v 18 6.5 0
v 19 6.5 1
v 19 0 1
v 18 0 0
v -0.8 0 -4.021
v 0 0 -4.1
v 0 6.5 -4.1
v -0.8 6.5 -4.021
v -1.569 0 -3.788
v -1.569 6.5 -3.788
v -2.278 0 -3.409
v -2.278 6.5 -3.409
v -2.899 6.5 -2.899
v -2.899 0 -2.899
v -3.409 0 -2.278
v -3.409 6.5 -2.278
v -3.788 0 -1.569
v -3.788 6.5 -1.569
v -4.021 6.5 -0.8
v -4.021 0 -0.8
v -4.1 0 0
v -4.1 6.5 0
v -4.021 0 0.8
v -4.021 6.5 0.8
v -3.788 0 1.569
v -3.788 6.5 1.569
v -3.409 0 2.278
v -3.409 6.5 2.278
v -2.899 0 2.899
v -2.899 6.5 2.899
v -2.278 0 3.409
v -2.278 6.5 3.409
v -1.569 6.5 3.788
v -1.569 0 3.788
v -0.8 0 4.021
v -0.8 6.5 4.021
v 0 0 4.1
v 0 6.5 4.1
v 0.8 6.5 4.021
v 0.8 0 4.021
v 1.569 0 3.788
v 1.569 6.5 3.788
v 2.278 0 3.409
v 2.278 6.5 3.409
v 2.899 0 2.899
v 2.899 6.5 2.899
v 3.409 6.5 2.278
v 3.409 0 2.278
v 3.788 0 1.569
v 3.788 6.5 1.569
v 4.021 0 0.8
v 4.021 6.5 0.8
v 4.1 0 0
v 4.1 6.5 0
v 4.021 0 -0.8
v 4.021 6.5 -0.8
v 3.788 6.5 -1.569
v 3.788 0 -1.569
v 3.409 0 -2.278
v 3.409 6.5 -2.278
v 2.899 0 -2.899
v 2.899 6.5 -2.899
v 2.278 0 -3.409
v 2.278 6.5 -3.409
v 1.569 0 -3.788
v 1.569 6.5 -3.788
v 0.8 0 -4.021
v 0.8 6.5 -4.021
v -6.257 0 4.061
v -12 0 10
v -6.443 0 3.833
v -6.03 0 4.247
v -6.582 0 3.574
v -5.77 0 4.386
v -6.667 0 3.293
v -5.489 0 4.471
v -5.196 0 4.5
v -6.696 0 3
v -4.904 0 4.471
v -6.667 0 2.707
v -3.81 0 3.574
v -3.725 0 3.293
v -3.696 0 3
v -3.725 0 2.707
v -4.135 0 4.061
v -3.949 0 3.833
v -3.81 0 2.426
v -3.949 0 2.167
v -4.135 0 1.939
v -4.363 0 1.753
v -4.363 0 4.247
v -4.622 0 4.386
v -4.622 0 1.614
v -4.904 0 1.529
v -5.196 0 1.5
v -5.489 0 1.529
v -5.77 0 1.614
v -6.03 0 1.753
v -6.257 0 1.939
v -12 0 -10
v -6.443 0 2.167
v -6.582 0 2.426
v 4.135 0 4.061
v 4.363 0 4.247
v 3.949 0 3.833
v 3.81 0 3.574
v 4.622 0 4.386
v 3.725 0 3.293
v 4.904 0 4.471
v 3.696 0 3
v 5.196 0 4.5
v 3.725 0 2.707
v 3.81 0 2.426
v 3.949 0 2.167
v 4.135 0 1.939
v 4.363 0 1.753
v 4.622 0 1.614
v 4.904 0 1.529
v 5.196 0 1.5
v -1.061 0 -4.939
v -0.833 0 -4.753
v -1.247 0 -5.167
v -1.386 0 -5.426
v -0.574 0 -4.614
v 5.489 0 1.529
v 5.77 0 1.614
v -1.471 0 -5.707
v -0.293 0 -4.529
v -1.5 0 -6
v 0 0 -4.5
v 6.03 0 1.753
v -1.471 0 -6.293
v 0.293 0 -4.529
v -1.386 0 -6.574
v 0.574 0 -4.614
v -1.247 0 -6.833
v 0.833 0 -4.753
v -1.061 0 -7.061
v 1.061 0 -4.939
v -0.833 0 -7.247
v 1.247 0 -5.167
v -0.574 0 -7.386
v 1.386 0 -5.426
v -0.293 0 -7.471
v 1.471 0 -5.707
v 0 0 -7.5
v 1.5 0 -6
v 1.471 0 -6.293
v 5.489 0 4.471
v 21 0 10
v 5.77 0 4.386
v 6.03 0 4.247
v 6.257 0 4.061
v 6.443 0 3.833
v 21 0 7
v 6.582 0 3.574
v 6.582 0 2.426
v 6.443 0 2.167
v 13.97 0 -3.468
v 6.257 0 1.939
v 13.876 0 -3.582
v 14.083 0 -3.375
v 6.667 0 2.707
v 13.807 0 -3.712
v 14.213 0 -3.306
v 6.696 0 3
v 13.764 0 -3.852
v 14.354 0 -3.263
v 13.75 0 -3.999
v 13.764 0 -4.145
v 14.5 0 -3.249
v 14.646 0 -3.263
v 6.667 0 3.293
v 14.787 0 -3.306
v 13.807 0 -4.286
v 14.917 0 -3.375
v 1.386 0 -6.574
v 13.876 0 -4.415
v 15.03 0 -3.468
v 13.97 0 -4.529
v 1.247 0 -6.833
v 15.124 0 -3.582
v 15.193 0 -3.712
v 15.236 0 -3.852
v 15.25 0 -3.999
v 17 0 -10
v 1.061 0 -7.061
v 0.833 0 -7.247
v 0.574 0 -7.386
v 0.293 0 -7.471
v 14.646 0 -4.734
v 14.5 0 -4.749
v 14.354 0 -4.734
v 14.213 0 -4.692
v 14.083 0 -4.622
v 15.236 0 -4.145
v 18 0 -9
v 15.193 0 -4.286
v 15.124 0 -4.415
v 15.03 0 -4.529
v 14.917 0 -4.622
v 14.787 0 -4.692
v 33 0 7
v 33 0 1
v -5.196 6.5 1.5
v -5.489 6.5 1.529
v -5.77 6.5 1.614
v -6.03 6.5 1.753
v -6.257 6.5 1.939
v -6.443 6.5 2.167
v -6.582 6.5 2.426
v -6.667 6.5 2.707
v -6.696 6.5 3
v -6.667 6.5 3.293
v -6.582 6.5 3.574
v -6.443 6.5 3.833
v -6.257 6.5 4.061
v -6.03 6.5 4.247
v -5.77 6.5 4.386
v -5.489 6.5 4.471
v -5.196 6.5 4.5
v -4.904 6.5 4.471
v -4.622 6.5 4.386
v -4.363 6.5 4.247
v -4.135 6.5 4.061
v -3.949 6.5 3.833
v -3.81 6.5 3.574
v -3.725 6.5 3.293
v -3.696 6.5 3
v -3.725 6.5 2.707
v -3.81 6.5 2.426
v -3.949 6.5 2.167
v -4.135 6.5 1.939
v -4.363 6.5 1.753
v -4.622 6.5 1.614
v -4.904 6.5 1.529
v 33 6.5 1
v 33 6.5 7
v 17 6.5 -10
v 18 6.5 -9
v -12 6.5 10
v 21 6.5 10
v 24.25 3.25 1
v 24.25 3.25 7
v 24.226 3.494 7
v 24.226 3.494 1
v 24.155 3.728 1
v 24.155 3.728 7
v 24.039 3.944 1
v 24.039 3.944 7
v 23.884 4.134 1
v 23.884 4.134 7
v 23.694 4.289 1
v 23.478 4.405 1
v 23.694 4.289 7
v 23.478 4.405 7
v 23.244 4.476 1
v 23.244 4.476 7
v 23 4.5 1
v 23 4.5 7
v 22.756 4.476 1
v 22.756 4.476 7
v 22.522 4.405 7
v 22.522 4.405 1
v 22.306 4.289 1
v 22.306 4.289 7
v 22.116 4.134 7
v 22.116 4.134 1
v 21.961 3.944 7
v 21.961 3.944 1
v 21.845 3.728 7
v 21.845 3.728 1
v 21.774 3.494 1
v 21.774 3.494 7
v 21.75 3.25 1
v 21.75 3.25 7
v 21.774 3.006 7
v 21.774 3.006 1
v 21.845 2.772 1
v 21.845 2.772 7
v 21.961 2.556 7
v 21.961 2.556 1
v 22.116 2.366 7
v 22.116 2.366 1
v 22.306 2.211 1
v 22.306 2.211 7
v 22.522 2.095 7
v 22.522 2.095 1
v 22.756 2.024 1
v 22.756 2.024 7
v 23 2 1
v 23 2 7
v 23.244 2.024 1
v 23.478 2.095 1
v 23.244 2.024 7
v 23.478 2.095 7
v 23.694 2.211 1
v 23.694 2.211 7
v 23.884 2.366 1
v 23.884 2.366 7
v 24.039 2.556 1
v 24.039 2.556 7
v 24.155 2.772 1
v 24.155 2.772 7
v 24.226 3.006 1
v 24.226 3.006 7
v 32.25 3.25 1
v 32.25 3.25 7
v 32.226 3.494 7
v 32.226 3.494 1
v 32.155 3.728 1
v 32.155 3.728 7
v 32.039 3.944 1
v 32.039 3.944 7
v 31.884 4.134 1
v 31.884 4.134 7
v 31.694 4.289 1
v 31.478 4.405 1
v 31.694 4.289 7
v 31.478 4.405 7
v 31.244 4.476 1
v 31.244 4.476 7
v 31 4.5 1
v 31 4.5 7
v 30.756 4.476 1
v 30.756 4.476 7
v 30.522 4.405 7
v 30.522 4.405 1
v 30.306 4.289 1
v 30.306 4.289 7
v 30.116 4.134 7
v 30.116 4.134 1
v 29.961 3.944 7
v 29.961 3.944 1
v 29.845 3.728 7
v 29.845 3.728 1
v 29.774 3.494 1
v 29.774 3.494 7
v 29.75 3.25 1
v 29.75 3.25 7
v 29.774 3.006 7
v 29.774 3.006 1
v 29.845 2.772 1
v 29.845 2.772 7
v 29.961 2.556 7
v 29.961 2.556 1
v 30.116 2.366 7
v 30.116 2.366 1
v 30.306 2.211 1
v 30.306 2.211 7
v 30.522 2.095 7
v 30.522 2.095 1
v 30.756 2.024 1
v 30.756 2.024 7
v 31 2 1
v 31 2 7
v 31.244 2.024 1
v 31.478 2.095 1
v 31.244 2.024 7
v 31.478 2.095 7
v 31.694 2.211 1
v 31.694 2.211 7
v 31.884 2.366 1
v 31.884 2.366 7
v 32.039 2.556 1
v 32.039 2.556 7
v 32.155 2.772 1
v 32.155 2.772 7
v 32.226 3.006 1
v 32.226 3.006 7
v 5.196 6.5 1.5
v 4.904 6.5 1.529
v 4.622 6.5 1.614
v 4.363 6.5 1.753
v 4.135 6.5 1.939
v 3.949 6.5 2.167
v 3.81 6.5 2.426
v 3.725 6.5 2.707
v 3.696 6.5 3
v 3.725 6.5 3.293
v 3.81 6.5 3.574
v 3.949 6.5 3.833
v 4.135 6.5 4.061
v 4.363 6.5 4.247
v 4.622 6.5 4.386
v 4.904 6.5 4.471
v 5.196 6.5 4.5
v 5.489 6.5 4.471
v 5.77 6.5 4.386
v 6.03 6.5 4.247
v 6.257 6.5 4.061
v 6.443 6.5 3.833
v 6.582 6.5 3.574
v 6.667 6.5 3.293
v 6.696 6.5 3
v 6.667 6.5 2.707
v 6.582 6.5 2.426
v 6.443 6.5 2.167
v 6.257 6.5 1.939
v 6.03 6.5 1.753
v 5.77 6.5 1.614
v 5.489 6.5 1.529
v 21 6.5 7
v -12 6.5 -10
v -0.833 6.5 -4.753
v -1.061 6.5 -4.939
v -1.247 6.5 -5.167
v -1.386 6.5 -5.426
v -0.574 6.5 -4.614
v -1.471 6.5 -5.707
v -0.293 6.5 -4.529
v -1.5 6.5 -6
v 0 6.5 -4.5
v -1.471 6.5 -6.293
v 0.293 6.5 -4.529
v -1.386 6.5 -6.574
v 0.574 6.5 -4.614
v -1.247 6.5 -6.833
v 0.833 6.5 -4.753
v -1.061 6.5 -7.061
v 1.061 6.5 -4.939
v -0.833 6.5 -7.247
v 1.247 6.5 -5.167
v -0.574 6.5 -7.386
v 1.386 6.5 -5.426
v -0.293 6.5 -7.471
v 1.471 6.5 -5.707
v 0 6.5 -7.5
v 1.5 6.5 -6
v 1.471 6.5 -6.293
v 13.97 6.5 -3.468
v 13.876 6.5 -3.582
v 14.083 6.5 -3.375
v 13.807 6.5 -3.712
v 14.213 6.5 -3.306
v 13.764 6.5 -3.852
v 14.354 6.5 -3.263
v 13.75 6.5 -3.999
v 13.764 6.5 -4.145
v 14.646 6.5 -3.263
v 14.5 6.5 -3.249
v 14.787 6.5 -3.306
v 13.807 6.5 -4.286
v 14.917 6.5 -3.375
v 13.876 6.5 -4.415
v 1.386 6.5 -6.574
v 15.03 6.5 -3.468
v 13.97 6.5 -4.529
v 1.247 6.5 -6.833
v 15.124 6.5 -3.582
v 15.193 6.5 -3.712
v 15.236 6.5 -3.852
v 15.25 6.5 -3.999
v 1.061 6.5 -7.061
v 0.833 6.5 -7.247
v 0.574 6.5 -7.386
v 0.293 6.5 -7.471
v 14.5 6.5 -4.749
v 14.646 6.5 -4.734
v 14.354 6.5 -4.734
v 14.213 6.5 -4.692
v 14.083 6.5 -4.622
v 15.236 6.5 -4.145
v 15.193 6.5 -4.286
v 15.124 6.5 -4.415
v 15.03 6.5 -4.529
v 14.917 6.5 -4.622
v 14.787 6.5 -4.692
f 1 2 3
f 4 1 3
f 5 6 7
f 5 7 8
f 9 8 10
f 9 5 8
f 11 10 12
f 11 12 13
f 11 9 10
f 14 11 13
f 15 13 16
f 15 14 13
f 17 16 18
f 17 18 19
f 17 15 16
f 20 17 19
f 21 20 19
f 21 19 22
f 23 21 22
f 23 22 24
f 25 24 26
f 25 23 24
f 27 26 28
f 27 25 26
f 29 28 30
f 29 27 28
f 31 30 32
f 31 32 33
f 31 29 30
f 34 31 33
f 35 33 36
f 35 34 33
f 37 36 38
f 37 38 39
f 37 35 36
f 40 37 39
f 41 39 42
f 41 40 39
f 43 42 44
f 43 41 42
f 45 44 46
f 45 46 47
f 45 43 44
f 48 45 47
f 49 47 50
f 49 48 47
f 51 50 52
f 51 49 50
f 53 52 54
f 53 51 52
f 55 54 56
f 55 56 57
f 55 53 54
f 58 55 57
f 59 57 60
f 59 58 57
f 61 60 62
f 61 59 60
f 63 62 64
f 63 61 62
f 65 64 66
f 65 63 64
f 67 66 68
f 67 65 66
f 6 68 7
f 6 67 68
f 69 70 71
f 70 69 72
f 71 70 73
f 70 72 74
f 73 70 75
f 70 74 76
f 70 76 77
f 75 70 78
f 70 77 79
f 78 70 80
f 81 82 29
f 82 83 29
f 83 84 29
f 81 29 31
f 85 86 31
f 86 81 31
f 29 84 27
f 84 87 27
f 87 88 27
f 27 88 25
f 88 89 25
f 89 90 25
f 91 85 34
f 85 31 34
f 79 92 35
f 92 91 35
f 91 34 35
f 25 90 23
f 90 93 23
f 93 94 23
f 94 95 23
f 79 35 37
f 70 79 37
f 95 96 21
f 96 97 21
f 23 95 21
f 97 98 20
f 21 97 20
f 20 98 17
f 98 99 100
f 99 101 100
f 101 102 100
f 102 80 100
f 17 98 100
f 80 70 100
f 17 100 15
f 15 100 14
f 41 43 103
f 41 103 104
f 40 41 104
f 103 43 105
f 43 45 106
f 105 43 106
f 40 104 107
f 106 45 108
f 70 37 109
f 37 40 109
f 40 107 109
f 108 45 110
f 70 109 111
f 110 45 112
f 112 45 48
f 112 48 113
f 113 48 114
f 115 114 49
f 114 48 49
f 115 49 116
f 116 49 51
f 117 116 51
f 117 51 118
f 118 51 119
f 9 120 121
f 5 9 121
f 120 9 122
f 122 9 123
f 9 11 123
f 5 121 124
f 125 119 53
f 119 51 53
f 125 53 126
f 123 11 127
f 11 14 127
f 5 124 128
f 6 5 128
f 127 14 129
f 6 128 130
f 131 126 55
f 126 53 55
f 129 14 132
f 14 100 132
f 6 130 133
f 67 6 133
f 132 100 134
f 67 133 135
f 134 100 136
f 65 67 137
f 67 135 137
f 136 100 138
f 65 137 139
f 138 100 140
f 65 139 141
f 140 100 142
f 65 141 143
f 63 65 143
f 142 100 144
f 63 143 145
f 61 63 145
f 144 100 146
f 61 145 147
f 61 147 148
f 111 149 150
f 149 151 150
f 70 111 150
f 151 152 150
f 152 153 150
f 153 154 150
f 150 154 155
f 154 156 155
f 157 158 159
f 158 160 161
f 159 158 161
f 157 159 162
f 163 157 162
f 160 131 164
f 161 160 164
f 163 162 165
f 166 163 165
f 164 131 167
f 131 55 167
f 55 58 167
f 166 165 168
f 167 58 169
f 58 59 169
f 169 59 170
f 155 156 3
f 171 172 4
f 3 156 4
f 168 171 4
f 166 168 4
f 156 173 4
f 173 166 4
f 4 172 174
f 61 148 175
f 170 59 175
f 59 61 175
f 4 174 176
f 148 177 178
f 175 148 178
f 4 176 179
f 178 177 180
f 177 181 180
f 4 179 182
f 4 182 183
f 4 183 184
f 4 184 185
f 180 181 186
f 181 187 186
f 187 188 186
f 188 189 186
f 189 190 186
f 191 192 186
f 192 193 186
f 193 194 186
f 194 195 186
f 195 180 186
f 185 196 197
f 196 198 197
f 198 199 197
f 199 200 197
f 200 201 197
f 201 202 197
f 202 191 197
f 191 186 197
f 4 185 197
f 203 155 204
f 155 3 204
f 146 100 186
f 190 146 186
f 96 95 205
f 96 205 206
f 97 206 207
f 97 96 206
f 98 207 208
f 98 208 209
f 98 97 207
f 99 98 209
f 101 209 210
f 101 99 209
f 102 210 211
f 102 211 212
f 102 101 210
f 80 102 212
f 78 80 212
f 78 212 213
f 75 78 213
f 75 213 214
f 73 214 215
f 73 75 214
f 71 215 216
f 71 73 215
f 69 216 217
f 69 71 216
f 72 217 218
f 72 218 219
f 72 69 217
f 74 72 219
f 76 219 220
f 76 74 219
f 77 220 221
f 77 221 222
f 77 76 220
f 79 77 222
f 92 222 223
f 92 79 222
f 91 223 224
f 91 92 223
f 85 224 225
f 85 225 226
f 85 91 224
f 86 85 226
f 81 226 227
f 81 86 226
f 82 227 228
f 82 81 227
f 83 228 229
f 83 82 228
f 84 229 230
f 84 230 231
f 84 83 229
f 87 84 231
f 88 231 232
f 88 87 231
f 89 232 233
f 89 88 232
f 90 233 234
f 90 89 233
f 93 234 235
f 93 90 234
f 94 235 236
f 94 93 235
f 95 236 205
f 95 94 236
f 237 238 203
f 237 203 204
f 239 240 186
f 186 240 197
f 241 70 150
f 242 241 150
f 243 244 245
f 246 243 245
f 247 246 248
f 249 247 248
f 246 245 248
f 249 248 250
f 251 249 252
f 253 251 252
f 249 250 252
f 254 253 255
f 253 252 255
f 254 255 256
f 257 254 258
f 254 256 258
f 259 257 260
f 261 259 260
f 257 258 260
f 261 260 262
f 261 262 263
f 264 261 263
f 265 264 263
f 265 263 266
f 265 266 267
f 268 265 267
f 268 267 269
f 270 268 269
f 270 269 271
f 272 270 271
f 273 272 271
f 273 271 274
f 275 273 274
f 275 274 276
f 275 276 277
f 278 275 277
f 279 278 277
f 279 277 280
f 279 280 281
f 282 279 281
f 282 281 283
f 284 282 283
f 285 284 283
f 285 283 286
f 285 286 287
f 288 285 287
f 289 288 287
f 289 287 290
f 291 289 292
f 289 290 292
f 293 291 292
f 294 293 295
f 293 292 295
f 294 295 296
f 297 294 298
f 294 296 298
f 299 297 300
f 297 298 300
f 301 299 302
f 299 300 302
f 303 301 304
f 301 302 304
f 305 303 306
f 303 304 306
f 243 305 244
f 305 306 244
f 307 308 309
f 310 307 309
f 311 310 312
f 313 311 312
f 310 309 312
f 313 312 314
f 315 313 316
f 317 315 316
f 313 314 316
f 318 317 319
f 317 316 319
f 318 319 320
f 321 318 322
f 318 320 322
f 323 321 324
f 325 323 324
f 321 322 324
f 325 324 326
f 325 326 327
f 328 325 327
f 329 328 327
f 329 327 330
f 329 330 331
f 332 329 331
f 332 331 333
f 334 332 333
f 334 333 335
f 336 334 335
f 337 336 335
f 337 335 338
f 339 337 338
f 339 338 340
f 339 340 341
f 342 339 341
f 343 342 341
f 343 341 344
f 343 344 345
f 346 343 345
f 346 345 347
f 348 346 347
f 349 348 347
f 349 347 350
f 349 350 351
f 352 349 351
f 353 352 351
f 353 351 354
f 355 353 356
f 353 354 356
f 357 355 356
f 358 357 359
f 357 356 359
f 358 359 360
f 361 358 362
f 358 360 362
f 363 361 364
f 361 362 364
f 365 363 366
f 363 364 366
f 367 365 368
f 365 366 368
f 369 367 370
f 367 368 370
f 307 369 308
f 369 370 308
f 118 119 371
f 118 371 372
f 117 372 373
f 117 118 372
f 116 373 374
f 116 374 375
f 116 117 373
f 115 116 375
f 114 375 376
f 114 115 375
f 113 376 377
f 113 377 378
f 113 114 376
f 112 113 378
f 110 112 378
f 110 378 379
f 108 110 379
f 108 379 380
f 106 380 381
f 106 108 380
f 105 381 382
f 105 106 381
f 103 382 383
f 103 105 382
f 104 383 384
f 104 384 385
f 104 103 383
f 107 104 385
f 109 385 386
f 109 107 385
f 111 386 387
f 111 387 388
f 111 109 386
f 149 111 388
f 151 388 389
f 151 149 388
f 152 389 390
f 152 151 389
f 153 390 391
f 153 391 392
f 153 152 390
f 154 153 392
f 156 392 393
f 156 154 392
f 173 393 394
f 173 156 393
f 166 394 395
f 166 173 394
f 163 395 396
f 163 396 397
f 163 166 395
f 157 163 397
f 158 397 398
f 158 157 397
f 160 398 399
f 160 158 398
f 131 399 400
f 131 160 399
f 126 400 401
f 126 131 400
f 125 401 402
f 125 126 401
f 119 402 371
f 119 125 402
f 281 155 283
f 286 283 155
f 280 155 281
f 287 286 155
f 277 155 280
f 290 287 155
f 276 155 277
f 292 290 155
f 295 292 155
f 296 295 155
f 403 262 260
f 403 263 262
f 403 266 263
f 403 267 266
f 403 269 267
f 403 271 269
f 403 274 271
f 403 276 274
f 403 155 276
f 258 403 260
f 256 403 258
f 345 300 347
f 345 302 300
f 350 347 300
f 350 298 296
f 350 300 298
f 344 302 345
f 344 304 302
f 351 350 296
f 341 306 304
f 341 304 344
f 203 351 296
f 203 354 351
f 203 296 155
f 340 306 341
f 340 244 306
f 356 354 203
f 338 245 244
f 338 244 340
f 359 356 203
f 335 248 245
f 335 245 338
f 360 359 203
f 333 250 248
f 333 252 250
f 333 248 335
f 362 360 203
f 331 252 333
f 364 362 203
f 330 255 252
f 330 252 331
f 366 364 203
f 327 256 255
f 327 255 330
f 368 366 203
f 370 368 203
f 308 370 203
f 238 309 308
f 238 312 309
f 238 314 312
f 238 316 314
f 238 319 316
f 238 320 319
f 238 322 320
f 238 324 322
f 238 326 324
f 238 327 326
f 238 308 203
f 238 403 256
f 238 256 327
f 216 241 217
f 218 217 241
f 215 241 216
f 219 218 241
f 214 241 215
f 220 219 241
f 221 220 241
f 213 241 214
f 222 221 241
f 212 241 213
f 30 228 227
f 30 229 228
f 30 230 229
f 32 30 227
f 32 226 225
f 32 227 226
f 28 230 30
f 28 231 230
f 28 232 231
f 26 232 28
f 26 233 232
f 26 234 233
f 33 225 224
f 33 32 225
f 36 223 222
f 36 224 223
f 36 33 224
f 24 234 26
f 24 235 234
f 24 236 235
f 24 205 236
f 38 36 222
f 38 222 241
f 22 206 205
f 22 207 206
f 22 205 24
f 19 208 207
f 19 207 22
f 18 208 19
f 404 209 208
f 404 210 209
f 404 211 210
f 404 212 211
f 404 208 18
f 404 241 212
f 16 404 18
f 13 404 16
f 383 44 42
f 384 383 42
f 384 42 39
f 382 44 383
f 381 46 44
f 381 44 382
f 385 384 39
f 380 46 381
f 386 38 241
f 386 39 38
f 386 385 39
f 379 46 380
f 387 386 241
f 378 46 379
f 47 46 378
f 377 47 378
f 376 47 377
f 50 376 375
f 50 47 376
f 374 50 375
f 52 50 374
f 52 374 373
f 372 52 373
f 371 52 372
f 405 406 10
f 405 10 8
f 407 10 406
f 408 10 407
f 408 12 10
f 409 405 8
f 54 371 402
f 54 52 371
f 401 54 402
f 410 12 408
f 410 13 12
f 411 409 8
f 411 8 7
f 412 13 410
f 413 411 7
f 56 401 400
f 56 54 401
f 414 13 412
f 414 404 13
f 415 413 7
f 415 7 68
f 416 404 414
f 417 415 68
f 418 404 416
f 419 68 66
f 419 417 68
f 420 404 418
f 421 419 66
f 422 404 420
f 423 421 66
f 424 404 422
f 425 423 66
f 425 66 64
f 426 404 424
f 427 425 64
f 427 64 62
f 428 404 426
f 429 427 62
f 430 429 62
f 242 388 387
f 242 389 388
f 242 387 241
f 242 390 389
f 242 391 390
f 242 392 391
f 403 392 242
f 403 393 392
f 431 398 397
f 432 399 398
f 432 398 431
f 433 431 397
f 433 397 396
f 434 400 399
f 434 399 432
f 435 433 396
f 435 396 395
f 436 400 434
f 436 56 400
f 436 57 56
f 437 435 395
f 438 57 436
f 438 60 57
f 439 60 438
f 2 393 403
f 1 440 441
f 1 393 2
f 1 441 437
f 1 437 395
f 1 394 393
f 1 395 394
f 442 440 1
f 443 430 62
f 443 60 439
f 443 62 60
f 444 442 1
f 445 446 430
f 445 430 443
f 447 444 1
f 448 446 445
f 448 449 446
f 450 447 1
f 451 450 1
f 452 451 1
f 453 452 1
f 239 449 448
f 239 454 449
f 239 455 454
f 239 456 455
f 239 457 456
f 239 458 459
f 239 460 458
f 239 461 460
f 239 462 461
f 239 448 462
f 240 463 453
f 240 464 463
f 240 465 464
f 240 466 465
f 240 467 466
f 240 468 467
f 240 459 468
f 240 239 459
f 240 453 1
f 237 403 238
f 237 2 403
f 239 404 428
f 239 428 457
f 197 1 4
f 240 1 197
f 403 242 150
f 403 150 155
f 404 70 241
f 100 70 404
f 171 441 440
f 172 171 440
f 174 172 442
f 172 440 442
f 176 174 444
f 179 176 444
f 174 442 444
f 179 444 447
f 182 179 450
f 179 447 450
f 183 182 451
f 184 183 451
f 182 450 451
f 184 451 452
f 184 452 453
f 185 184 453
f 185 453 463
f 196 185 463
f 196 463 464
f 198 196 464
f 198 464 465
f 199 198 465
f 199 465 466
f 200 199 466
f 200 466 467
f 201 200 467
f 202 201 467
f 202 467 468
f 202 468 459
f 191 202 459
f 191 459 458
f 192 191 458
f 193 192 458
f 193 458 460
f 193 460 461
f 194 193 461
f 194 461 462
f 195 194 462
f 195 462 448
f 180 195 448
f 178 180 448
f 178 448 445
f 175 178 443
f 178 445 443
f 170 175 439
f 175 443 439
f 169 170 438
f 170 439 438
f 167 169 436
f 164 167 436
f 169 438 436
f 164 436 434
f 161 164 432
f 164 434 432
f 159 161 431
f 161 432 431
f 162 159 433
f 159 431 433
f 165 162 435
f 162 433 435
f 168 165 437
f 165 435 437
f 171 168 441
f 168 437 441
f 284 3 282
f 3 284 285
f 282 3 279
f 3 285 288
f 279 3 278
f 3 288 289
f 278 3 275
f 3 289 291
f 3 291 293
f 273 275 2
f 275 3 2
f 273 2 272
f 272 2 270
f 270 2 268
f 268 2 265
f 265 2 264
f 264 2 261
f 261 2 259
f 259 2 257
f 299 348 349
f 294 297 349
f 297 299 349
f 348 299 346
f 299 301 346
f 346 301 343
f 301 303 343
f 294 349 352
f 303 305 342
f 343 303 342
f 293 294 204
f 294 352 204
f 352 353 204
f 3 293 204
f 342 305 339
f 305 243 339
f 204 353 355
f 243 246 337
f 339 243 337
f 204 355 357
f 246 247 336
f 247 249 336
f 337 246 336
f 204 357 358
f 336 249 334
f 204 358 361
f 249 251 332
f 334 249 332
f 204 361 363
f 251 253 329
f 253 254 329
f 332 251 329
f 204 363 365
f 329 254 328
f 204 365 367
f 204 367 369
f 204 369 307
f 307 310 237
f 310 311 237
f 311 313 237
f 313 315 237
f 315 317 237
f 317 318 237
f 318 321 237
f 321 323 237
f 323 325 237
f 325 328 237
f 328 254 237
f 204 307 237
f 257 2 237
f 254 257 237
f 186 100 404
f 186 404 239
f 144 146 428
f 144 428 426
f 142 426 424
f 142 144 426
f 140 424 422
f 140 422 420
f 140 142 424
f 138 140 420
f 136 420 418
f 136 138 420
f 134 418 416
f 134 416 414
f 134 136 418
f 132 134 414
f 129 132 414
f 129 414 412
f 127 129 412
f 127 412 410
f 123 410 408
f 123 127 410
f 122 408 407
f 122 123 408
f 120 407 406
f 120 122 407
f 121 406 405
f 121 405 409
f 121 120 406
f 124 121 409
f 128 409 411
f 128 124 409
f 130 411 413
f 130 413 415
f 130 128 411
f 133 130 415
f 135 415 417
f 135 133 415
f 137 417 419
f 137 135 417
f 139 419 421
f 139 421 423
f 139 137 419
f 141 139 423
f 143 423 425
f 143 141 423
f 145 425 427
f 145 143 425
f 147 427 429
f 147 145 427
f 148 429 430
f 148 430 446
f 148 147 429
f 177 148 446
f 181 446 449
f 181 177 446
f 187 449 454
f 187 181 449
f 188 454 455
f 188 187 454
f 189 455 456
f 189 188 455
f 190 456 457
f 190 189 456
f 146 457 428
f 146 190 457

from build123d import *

# Parameters (mm, degrees)
SKETCH_1_W          = 47
SKETCH_1_H          = 20
SKETCH_1_R          = 1.5
SKETCH_1_R_2        = 4.1
EXTRUDE_1_DEPTH     = 6.5
SKETCH_2_W          = 12
SKETCH_2_H          = 3
SKETCH_2_W_2        = 17
SKETCH_2_H_2        = 11
CUT_EXTRUDE_1_DEPTH = 37.976343789
SKETCH_3_R          = 1.25
CUT_EXTRUDE_2_DEPTH = 40.449334595
SKETCH_4_R          = 0.75
CUT_EXTRUDE_3_DEPTH = 37.976343789
CHAMFER_1_SIZE      = 1
SKETCH_5_W          = 2
SKETCH_5_H          = 9
CUT_EXTRUDE_4_DEPTH = 37.976343789


with BuildPart() as part:
    # 草图1 → 凸台-拉伸1 (new body)
    with BuildSketch(Plane(origin=(0, 0, 0), x_dir=(1, 0, 0), z_dir=(0, 1, 0))):
        with Locations((11.5, 0)):
            Rectangle(SKETCH_1_W, SKETCH_1_H)
        with Locations(Location((0, 6, 0), (0, 0, 90))):
            Circle(SKETCH_1_R, mode=Mode.SUBTRACT)
        with Locations(Location((5.196152423, -3, 0), (0, 0, 90))):
            Circle(SKETCH_1_R, mode=Mode.SUBTRACT)
        with Locations(Location((-5.196152423, -3, 0), (0, 0, 90))):
            Circle(SKETCH_1_R, mode=Mode.SUBTRACT)
        with Locations(Location((0, 0, 0), (0, 0, 90))):
            Circle(SKETCH_1_R_2, mode=Mode.SUBTRACT)
    extrude(amount=EXTRUDE_1_DEPTH)

    # 草图2 → 切除-拉伸1 (cut, through all)
    with BuildSketch(Plane(origin=(0, 6.5, 0), x_dir=(1, 0, 0), z_dir=(0, 1, 0))):
        with Locations((27, -8.5)):
            Rectangle(SKETCH_2_W, SKETCH_2_H)
        with Locations((26.5, 4.5)):
            Rectangle(SKETCH_2_W_2, SKETCH_2_H_2)
    extrude(amount=-CUT_EXTRUDE_1_DEPTH, mode=Mode.SUBTRACT)

    # 草图3 → 切除-拉伸2 (cut, through all)
    with BuildSketch(Plane.XY.offset(7)):
        with Locations((23, 3.25)):
            Circle(SKETCH_3_R)
        with Locations((31, 3.25)):
            Circle(SKETCH_3_R)
    extrude(amount=-CUT_EXTRUDE_2_DEPTH, mode=Mode.SUBTRACT)

    # 草图4 → 切除-拉伸3 (cut, through all)
    with BuildSketch(Plane(origin=(0, 6.5, 0), x_dir=(1, 0, 0), z_dir=(0, 1, 0))):
        with Locations(Location((14.5, 3.99875811, 0), (0, 0, 270))):
            Circle(SKETCH_4_R)
    extrude(amount=-CUT_EXTRUDE_3_DEPTH, mode=Mode.SUBTRACT)

    # 倒角1
    chamfer_1_edges = [part.edges().sort_by_distance(p)[0] for p in [
        (18, 3.25, 1),
        (18, 3.25, -10),
    ]]
    chamfer(chamfer_1_edges, length=CHAMFER_1_SIZE)

    # 草图5 → 切除-拉伸4 (cut, through all)
    with BuildSketch(Plane(origin=(0, 6.5, 0), x_dir=(1, 0, 0), z_dir=(0, 1, 0))):
        with Locations((34, -5.5)):
            Rectangle(SKETCH_5_W, SKETCH_5_H)
    extrude(amount=-CUT_EXTRUDE_4_DEPTH, mode=Mode.SUBTRACT)


solid = part.part
